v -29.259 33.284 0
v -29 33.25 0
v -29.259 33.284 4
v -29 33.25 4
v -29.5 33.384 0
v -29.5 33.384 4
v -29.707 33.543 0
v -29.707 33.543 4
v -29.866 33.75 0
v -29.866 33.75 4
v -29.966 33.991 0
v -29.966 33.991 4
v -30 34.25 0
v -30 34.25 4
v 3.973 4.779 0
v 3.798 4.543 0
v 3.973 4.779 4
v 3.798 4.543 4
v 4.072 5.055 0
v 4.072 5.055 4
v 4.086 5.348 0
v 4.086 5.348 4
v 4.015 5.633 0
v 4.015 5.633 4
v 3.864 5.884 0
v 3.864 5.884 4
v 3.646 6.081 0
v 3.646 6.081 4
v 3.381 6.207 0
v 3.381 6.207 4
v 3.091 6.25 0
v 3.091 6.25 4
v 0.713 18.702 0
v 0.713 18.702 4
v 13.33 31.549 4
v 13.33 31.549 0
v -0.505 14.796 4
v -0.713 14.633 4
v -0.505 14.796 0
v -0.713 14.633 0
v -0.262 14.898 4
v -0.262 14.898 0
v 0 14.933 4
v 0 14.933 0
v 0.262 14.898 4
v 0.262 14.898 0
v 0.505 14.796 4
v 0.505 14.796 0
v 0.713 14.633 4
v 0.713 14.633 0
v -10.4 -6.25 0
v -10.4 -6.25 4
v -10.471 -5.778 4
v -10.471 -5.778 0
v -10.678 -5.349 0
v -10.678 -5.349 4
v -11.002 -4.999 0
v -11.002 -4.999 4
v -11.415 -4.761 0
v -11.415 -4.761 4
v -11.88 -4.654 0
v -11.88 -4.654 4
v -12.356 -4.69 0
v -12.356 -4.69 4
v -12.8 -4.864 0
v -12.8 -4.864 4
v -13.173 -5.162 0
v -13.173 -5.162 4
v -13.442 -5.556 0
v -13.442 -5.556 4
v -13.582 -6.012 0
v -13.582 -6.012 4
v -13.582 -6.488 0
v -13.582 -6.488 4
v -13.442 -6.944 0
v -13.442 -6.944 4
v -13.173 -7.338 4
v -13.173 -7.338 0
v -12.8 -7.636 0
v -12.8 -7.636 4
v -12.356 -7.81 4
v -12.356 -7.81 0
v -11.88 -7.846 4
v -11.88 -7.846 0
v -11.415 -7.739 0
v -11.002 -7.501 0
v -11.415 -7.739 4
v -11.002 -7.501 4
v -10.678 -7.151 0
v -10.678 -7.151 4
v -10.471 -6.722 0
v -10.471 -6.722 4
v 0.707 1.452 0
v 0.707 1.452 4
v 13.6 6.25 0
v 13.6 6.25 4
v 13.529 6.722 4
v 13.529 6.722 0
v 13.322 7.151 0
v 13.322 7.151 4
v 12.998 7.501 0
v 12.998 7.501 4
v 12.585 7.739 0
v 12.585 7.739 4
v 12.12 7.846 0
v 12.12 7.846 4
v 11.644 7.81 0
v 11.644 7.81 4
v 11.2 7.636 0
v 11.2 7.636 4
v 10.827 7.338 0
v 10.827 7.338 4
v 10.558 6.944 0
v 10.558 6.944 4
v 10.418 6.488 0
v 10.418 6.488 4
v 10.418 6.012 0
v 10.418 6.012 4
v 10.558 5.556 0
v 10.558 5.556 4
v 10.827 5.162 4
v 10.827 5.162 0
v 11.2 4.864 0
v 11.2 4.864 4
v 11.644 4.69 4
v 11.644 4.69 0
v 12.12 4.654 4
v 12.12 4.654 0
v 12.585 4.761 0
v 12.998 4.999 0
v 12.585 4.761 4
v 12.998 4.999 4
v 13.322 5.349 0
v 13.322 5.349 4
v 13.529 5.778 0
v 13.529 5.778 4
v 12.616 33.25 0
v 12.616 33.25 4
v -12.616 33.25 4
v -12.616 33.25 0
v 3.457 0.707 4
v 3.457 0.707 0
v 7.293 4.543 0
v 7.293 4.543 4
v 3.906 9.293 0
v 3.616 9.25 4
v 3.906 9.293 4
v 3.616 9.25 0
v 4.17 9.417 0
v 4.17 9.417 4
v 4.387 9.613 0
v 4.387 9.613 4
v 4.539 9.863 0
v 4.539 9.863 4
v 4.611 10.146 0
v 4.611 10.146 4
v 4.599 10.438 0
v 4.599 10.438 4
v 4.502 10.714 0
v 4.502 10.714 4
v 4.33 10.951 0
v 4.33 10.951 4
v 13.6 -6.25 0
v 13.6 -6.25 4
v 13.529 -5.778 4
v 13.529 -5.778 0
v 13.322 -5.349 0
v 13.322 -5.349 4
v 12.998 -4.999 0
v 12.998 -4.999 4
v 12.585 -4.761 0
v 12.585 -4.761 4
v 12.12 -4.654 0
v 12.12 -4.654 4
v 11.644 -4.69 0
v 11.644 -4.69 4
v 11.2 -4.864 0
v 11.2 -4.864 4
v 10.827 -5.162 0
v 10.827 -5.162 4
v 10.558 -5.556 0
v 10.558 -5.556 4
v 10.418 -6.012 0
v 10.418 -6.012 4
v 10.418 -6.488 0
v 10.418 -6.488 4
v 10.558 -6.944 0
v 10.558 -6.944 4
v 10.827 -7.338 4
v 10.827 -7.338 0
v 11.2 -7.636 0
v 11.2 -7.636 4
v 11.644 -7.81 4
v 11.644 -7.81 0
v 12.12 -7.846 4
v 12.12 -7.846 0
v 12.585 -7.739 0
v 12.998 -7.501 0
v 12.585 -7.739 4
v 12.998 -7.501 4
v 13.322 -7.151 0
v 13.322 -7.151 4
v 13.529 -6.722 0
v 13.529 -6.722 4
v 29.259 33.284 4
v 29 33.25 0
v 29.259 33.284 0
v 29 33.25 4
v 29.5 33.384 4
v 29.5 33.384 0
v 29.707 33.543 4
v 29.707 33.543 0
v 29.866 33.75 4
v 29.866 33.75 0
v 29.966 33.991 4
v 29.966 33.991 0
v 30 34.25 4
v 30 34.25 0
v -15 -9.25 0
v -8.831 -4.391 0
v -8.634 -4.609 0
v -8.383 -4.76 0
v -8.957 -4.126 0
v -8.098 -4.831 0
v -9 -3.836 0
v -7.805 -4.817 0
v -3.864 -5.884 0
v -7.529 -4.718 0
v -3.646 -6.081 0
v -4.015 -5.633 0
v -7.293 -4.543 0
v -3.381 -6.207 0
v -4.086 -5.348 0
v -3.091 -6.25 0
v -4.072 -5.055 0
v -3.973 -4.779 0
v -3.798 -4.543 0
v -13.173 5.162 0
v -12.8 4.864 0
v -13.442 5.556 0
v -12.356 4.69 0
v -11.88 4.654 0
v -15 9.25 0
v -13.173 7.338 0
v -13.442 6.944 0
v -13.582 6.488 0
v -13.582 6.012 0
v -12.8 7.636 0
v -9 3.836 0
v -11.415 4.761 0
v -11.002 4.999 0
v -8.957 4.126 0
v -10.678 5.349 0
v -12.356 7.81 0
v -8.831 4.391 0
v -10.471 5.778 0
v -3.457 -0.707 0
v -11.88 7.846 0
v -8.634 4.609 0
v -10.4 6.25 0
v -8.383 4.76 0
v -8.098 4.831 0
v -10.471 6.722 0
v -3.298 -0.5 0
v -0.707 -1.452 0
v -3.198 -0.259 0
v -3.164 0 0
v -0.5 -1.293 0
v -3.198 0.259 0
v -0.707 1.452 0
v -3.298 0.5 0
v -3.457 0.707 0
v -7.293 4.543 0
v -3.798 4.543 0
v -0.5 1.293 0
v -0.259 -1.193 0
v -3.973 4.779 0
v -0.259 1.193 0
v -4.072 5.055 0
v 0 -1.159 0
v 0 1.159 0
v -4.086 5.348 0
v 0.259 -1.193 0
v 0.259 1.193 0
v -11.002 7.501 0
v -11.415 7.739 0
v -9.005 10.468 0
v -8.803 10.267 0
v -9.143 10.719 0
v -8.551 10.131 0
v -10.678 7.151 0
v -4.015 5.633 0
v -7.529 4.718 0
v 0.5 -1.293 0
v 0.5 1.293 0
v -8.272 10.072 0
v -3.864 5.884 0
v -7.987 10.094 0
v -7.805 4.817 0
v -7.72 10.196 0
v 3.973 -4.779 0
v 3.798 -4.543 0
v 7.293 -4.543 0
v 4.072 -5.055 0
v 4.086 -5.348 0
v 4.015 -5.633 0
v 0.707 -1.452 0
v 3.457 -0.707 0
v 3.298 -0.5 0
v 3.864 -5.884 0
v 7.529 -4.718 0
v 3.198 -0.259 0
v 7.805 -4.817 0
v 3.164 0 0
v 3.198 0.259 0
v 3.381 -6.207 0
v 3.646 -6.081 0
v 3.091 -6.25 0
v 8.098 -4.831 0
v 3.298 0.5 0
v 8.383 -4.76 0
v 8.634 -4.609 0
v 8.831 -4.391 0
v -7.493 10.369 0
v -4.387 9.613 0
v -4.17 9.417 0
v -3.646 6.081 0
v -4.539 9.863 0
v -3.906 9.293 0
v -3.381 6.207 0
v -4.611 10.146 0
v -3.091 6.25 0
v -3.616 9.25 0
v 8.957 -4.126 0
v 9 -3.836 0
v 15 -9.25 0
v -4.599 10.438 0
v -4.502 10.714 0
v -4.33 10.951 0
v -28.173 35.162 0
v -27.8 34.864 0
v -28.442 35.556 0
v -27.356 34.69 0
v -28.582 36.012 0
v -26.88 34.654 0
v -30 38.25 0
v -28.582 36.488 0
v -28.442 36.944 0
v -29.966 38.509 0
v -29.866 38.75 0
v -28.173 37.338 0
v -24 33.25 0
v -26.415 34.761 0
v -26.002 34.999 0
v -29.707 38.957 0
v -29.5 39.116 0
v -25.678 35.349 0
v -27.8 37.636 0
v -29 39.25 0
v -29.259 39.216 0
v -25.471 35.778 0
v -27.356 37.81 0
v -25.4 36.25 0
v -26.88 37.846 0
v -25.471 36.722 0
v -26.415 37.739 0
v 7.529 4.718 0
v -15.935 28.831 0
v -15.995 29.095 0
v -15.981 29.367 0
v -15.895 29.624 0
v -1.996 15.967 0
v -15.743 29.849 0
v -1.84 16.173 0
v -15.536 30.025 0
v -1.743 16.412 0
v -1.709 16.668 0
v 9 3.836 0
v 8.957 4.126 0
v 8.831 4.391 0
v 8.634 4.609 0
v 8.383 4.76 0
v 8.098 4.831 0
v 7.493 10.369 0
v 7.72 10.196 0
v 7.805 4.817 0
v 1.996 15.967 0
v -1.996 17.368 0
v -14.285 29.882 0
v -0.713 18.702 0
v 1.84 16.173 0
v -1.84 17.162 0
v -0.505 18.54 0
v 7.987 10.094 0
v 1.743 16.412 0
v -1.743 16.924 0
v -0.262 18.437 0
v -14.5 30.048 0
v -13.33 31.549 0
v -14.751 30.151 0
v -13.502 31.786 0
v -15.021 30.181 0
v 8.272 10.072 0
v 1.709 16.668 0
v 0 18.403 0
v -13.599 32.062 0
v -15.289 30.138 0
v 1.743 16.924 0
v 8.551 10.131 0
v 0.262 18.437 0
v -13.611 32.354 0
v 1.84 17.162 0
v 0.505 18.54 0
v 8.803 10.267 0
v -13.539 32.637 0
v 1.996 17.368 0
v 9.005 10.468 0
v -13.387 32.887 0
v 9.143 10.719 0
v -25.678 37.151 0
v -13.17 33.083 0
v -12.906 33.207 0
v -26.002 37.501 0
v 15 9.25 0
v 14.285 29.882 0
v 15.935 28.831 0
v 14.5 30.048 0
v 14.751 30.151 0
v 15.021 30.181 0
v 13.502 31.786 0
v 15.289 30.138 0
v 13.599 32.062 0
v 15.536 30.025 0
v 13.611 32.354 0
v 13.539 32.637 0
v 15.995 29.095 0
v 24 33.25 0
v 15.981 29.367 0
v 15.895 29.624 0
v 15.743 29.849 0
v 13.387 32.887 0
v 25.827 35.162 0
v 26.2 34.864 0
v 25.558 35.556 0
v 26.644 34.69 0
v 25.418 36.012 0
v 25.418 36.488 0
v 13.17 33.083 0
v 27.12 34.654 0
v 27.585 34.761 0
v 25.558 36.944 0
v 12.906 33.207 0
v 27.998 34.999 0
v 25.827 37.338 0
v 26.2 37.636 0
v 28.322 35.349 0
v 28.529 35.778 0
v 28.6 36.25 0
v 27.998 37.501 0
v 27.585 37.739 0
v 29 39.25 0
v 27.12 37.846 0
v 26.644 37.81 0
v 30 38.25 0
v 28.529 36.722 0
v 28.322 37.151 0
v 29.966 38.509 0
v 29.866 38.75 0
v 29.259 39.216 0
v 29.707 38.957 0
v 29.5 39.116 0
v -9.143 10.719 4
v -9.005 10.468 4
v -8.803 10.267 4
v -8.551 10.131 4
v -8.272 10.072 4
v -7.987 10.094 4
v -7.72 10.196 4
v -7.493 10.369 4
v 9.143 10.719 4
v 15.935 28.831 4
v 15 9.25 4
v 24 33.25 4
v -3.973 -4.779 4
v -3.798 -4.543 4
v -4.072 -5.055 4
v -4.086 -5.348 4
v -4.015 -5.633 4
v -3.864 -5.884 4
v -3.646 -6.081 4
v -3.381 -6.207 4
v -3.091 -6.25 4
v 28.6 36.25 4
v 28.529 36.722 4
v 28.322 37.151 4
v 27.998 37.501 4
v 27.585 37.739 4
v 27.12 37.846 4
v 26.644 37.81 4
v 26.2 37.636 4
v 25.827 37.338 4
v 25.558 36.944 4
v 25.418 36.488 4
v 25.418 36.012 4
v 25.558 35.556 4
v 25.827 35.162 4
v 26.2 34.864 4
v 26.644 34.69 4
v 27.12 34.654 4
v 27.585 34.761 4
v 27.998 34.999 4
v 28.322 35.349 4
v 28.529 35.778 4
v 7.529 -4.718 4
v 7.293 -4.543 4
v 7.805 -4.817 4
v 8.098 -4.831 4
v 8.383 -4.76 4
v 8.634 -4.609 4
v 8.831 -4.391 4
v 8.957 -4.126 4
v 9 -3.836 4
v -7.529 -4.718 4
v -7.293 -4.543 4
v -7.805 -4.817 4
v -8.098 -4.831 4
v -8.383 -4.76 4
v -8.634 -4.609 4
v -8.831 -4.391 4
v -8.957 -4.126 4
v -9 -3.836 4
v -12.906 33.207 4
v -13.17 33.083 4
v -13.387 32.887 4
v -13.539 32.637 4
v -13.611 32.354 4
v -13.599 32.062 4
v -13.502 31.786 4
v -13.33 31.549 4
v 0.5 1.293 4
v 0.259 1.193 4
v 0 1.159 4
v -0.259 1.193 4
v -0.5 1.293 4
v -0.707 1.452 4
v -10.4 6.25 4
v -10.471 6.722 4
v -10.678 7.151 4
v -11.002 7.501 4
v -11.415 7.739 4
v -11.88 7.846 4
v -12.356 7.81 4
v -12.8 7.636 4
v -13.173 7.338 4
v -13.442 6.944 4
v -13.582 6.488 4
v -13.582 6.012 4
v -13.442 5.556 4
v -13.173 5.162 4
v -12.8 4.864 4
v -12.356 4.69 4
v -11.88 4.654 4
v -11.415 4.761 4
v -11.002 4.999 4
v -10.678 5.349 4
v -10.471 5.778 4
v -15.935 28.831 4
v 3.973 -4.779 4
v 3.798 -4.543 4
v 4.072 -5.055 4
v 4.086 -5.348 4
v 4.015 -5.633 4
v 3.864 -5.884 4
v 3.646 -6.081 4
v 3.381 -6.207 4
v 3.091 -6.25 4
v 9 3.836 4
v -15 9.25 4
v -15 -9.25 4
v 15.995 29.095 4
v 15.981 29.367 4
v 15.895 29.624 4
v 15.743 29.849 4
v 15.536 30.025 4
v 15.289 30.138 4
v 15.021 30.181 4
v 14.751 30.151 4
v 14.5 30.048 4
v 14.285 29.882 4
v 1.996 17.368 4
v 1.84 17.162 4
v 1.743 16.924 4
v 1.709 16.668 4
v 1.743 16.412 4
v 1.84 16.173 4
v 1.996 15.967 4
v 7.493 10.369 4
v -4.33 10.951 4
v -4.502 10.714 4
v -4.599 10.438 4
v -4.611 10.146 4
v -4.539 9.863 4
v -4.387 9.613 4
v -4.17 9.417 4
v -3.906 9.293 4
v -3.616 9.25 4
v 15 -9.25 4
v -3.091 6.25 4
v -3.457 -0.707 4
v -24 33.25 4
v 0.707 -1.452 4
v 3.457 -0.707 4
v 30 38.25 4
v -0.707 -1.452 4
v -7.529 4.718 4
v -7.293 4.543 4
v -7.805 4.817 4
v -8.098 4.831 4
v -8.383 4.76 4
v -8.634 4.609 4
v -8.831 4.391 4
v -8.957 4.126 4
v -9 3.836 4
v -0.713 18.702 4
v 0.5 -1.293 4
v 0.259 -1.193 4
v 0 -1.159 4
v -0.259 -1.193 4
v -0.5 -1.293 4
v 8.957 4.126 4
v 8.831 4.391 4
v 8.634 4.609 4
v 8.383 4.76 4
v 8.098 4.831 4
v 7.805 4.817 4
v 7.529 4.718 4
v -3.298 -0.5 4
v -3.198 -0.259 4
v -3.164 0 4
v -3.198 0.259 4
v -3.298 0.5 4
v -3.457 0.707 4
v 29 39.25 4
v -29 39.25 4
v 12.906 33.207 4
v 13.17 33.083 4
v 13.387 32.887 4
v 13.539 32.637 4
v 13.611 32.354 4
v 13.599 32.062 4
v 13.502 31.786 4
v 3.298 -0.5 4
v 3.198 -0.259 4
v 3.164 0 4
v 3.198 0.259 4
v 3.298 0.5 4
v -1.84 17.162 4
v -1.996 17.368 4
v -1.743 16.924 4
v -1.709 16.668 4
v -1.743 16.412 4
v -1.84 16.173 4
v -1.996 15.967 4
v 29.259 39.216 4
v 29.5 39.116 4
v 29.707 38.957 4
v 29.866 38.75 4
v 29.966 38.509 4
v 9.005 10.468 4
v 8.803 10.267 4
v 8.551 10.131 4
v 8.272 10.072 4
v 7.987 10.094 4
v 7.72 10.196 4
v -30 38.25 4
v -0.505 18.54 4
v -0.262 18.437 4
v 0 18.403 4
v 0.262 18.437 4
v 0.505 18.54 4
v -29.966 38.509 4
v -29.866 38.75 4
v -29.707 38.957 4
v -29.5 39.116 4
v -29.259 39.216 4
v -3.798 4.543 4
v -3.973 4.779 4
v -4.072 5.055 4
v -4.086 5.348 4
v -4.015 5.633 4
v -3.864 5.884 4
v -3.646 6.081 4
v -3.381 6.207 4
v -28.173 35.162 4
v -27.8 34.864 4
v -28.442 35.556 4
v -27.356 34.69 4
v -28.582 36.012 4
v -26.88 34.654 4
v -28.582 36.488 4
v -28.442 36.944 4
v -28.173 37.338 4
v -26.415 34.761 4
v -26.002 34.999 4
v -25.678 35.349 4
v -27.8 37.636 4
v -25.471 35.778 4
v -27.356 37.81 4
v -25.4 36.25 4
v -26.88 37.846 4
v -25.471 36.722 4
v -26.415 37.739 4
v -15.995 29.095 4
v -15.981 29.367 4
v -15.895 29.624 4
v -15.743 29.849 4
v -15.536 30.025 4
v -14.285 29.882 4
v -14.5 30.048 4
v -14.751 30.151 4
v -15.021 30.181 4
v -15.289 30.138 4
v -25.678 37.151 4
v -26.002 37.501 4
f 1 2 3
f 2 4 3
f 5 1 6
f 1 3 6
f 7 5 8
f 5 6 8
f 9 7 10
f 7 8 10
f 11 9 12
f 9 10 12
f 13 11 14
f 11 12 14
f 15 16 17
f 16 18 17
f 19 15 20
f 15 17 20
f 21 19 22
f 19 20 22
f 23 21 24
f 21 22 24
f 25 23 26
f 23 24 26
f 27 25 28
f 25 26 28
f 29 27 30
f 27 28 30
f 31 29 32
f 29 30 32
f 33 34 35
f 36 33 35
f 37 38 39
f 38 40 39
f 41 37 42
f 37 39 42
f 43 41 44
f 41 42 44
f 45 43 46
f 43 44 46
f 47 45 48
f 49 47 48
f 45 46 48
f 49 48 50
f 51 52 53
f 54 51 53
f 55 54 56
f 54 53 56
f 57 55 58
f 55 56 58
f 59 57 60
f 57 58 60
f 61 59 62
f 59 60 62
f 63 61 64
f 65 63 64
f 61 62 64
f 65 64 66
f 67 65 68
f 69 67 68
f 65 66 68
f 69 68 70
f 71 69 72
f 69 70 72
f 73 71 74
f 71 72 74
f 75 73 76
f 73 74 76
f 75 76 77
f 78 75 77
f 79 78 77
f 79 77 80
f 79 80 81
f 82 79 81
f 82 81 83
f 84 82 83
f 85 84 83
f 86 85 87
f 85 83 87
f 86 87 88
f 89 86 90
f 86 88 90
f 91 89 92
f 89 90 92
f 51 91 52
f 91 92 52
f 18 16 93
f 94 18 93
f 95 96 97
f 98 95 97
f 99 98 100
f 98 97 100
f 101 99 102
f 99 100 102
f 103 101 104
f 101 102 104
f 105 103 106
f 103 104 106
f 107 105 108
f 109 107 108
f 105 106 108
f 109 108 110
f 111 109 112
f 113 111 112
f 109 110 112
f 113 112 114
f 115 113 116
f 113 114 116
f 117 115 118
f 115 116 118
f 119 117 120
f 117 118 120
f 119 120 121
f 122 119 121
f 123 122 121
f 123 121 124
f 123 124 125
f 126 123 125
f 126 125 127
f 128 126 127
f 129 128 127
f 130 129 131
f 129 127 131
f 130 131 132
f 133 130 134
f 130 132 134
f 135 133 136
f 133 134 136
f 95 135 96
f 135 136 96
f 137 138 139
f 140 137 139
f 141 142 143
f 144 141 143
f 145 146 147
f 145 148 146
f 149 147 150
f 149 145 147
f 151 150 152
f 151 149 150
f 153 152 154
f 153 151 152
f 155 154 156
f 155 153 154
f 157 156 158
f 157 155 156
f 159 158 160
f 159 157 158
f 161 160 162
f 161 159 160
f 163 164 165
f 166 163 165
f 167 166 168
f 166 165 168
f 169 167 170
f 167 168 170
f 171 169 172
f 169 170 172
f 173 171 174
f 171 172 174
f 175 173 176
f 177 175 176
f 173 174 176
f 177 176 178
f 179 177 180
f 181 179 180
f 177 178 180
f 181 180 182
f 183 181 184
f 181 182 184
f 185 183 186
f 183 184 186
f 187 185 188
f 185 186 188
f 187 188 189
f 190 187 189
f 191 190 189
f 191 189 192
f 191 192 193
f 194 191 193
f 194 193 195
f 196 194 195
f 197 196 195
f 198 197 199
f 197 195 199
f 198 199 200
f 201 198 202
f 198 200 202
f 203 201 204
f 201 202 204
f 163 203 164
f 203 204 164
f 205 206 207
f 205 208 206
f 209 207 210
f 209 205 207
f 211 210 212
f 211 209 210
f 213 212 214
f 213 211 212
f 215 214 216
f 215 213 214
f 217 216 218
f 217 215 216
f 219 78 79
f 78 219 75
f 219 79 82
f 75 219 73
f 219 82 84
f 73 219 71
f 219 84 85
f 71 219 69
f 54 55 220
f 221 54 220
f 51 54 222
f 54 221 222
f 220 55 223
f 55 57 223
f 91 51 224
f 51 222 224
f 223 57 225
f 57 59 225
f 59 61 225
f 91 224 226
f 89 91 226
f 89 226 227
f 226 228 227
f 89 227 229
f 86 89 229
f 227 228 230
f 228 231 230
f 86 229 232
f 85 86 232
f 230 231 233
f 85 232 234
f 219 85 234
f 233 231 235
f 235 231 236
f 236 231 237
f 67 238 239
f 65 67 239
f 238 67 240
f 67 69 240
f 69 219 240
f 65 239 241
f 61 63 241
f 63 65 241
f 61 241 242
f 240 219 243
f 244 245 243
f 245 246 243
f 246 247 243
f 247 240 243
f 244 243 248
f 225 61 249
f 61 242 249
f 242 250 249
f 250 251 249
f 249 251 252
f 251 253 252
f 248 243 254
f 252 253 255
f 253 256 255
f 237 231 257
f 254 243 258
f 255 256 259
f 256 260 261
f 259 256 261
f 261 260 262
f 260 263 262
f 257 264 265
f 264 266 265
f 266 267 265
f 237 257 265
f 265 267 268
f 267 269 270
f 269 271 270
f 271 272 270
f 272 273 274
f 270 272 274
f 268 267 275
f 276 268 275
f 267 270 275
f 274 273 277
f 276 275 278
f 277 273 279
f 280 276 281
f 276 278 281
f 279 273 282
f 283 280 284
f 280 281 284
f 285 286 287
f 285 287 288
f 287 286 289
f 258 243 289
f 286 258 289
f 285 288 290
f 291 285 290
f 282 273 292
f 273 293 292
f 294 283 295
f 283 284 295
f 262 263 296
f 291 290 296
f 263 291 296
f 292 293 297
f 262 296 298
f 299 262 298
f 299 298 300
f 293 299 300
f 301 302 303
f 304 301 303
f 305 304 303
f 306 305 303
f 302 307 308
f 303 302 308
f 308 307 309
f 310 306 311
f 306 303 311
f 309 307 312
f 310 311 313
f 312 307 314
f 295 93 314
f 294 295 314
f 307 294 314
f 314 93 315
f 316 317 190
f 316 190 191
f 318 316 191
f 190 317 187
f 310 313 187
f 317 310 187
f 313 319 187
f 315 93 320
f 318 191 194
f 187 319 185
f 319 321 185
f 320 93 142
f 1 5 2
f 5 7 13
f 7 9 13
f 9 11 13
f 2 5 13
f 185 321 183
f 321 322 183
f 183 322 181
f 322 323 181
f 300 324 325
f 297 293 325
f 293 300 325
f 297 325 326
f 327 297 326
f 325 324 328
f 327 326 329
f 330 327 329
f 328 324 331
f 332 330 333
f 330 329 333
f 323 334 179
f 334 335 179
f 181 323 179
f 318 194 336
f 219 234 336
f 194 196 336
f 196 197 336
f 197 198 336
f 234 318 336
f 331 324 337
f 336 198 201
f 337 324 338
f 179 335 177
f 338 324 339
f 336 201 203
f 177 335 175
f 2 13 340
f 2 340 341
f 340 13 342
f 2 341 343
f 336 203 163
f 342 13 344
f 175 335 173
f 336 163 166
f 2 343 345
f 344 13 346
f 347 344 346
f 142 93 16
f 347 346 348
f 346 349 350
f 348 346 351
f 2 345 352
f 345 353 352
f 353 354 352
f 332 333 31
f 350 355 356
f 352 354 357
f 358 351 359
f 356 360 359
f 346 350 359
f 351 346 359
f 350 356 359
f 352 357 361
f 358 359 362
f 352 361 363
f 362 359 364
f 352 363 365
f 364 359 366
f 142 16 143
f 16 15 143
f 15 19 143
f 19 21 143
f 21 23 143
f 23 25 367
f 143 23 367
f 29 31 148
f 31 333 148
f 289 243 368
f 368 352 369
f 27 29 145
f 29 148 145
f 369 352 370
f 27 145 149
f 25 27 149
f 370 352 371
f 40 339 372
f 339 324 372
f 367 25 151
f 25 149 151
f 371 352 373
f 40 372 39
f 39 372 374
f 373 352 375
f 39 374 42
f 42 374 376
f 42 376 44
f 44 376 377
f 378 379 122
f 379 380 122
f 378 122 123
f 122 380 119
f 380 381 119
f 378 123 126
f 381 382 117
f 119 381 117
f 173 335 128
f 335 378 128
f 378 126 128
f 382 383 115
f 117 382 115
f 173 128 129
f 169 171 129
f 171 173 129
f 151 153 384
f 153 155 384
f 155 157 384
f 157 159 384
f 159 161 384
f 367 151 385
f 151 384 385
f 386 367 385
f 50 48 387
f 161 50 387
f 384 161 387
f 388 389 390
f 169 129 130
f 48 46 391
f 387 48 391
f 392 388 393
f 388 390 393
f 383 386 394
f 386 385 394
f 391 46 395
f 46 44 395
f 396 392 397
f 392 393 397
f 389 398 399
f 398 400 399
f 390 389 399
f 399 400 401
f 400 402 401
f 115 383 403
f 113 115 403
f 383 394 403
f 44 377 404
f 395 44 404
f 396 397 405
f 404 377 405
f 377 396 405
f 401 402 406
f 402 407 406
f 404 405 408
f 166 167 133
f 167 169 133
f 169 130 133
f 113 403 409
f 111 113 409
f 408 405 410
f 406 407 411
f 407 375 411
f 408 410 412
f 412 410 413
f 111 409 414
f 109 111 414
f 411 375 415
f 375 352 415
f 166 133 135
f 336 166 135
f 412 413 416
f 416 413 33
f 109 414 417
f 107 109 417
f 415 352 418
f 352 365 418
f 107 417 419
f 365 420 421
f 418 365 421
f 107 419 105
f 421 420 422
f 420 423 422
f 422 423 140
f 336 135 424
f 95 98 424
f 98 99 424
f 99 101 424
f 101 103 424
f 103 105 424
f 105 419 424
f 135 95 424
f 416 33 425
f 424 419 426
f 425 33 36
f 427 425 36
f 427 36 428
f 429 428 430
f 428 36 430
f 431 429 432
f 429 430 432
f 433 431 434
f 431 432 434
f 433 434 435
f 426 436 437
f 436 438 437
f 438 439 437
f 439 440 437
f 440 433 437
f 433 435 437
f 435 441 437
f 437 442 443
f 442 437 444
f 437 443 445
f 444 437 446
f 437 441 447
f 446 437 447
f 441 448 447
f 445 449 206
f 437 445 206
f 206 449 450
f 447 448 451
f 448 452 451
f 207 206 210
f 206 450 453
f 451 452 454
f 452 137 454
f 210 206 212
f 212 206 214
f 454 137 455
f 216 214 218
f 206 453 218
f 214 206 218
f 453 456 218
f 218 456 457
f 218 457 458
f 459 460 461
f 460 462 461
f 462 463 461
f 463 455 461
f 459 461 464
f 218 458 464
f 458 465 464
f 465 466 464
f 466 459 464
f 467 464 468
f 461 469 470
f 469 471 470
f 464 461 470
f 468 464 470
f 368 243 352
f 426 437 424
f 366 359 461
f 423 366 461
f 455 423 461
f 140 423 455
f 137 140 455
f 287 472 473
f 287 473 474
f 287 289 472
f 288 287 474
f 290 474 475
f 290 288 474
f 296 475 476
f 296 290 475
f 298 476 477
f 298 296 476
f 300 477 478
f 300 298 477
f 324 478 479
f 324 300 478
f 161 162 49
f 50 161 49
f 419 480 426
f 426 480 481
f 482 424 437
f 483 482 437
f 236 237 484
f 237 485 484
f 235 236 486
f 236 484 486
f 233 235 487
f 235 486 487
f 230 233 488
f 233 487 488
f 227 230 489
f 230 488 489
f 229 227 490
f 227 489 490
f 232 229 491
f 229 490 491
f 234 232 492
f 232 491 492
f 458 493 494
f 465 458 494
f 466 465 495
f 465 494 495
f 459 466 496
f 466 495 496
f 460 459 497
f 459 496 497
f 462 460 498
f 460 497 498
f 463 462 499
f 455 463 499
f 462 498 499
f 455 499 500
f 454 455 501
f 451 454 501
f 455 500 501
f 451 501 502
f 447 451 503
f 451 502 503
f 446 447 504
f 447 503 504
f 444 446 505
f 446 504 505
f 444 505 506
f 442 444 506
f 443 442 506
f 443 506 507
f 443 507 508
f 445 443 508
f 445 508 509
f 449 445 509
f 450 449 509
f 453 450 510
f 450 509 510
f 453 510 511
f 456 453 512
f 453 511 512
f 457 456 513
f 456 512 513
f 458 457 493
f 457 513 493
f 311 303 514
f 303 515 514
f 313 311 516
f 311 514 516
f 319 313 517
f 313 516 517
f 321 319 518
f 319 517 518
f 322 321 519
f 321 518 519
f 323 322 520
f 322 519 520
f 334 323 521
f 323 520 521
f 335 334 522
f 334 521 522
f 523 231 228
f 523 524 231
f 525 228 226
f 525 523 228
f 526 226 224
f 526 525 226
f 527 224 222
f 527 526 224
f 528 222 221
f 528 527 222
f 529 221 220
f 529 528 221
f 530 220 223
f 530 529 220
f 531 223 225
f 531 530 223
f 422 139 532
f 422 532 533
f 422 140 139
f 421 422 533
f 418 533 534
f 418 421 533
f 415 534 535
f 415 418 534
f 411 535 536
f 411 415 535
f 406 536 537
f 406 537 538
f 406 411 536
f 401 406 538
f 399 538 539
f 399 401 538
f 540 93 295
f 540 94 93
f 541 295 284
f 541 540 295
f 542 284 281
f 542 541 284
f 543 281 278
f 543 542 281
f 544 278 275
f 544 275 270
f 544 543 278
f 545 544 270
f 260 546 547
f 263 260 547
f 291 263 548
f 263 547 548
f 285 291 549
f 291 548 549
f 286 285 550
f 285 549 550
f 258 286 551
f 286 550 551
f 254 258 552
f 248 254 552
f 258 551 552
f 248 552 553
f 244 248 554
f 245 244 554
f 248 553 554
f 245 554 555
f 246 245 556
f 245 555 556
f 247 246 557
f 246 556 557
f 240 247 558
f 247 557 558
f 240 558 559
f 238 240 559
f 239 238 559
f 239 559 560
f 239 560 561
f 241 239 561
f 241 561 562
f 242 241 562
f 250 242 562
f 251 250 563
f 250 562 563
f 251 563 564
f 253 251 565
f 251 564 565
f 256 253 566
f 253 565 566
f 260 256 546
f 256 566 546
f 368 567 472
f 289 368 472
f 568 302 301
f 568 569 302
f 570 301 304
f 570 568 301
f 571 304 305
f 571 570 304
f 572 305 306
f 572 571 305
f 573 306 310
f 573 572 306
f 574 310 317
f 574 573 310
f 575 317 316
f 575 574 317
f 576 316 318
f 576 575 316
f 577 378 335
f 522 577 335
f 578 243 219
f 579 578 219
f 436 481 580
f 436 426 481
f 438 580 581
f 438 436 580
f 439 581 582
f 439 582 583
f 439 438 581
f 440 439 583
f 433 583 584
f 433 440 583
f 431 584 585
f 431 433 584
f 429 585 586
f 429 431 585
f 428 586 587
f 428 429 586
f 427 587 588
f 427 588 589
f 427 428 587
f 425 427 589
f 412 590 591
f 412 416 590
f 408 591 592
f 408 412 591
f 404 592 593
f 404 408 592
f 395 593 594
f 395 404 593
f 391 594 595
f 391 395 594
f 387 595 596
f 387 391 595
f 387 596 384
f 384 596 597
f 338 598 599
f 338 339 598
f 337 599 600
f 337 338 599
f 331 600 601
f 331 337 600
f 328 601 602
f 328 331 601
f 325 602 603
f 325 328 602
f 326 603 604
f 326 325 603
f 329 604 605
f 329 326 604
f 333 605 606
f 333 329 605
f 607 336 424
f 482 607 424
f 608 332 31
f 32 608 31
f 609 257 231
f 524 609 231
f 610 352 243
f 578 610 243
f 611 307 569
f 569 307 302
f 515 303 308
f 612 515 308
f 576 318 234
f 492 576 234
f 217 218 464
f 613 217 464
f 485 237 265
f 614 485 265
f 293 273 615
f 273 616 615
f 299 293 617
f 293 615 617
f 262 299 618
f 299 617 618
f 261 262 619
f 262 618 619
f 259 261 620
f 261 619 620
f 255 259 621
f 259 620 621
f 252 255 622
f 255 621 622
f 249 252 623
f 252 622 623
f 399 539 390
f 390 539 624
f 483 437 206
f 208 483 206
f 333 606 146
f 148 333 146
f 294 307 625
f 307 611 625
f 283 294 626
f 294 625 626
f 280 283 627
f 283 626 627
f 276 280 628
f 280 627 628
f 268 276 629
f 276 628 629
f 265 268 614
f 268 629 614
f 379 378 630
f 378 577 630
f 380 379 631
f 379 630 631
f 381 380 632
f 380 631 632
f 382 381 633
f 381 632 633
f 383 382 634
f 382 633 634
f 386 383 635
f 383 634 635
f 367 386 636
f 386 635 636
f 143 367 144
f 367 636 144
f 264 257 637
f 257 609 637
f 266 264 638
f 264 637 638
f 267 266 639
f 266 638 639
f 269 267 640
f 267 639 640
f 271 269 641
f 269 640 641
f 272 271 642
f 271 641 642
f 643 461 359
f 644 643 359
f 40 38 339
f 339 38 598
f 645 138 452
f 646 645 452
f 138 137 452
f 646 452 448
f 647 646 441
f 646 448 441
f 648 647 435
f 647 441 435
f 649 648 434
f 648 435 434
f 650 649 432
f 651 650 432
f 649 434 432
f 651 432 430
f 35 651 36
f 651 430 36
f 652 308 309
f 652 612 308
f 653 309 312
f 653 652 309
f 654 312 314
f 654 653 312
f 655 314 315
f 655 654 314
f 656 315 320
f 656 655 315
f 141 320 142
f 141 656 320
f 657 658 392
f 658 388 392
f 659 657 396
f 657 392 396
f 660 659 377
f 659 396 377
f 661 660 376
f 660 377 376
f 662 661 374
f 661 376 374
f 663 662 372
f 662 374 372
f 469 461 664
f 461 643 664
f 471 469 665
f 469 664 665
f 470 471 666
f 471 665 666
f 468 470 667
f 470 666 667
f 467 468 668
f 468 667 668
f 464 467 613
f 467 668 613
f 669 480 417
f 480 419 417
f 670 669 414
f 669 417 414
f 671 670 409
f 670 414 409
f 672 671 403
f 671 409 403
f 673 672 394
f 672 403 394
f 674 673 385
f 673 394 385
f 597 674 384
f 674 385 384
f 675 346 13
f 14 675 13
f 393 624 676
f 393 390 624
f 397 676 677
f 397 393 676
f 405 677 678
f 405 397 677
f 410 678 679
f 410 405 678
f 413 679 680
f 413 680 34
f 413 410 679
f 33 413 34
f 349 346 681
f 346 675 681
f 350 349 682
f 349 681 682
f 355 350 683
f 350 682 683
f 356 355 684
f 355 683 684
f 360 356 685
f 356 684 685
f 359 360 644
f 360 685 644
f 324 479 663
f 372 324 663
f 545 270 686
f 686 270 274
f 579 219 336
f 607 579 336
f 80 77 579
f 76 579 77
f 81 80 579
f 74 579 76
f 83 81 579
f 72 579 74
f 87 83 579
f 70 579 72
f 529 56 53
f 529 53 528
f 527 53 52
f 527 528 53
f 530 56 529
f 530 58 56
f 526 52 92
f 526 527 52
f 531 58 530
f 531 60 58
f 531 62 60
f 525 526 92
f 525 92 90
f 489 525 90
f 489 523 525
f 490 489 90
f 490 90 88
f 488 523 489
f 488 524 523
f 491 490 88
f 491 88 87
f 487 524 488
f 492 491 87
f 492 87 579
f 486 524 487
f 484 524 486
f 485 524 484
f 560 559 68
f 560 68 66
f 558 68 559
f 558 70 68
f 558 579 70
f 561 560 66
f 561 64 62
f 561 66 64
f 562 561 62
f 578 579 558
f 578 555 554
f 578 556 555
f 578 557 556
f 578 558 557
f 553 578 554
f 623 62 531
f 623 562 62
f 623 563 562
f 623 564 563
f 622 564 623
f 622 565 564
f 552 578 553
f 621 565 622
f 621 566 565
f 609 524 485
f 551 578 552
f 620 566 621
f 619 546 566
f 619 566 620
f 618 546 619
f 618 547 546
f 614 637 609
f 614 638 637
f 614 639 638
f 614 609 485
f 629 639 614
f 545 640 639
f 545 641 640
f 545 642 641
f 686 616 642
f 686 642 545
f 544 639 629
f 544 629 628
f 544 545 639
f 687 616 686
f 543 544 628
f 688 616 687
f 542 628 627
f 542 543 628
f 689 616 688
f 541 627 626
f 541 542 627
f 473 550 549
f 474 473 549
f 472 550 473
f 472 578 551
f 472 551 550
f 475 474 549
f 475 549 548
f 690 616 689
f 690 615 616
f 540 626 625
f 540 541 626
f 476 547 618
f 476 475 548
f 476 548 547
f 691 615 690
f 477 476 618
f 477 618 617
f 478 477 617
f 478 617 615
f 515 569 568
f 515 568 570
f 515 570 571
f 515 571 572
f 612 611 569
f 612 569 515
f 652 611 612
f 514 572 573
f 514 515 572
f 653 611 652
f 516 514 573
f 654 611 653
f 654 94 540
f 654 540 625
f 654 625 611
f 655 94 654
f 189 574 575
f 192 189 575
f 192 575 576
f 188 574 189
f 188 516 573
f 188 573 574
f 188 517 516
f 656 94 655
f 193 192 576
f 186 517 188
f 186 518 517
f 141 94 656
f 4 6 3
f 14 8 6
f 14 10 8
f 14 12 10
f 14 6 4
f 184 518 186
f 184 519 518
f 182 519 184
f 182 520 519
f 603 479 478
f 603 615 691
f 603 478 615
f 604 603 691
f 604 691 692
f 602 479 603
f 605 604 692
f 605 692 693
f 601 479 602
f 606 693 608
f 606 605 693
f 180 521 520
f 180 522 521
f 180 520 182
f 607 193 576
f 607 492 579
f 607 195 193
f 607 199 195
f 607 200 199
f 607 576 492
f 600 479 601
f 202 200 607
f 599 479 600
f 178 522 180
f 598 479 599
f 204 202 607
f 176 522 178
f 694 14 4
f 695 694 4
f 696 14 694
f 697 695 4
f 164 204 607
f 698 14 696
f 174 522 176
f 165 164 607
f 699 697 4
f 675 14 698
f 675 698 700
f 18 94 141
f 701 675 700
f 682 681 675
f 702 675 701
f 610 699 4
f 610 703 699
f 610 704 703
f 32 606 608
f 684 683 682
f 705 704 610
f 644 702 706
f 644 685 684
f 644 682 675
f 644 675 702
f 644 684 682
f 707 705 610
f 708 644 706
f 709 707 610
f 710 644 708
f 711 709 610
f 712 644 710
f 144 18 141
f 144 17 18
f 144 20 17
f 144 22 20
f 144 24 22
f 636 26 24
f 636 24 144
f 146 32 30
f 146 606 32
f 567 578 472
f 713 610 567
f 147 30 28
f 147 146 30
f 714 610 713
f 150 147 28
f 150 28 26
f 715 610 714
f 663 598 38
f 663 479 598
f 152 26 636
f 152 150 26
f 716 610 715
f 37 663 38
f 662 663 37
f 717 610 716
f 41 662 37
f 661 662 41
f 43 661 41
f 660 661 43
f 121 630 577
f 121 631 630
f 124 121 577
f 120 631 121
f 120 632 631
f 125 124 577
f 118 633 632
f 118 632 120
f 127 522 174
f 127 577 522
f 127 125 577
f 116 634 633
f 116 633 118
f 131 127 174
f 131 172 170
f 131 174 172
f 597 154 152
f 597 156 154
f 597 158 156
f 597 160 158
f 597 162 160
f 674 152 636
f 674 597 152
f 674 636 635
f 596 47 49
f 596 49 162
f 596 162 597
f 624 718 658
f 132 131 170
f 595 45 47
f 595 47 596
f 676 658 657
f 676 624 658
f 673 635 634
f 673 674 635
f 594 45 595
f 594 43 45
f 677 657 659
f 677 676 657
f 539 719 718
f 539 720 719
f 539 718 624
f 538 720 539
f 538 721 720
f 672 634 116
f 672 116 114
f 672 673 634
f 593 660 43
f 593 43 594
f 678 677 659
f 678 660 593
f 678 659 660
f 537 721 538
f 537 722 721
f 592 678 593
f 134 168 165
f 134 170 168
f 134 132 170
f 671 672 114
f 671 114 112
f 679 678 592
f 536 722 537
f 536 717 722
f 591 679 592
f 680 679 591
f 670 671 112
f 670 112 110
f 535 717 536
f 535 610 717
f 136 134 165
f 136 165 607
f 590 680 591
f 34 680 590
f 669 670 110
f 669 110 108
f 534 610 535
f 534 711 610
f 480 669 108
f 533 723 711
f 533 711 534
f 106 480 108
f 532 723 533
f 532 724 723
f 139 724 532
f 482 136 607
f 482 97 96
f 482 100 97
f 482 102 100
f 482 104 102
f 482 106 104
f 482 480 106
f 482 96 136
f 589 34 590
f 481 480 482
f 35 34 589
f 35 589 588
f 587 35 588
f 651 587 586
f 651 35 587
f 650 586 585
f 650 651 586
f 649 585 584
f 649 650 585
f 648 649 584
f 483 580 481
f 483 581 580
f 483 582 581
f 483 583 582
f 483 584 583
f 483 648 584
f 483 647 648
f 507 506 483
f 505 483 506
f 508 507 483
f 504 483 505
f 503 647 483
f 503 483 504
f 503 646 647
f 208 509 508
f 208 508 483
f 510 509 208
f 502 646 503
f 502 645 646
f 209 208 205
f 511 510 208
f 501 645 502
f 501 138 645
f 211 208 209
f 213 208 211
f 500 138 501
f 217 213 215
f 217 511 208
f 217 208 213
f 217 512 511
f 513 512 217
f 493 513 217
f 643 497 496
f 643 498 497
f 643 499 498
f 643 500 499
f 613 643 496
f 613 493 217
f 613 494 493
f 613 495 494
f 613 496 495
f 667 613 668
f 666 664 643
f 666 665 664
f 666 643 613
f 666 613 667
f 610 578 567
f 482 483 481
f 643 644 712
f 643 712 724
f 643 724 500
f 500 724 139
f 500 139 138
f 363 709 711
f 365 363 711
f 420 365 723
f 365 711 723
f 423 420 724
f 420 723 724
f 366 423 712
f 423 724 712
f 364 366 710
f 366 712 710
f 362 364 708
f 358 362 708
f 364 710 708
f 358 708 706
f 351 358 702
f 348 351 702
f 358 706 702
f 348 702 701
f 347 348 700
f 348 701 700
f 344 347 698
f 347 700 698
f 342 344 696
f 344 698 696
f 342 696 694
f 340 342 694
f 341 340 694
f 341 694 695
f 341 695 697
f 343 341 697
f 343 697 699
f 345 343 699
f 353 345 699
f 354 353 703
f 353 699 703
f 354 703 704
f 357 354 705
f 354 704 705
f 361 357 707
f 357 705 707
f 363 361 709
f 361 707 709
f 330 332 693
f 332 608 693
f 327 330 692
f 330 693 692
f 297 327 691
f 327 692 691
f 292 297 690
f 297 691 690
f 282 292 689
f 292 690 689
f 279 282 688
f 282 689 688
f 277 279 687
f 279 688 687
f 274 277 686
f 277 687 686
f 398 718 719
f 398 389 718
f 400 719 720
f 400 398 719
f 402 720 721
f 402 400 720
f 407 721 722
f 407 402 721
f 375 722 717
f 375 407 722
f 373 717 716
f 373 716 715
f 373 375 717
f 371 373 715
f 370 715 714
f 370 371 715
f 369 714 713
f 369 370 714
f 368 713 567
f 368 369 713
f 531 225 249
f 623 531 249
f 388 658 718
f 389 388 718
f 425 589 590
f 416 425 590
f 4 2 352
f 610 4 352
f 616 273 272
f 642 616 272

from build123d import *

# Parameters (mm, degrees)
F1_DEPTH = 4
F2_R     = 1.6
F3_DEPTH = 4
F5_DEPTH = 4
F6_R     = 1
F7_R     = 1
F9_DEPTH = 4
F10_R    = 1


with BuildPart() as f1:
    # F0 (on Top) → F1 (new body)
    with BuildSketch(Plane.XY):
        Polygon((-15, 9.25), (-15, -9.25), (15, -9.25), (15, 9.25), (24, 33.25), (30, 33.25), (30, 39.25), (-30, 39.25), (-30, 33.25), (-24, 33.25), align=None)
    extrude(amount=F1_DEPTH)

    # F2 (on face) → F3 (cut, through all)
    with BuildSketch(Plane.XY.offset(4)):
        with Locations((-12, 6.25)):
            Circle(F2_R)
        with Locations((12, 6.25)):
            Circle(F2_R)
        with Locations((-12, -6.25)):
            Circle(F2_R)
        with Locations((12, -6.25)):
            Circle(F2_R)
        with Locations((27, 36.25)):
            Circle(F2_R)
        with Locations((-27, 36.25)):
            Circle(F2_R)
    extrude(amount=-F3_DEPTH, mode=Mode.SUBTRACT)

    # F4 (on face) → F5 (cut, through all)
    with BuildSketch(Plane.XY.offset(4)):
        Polygon((-1.307755, 16.667609), (-17.591997, 33.25), (-8.591997, 9.25), align=None)
        Polygon((8.591997, 9.25), (17.591997, 33.25), (1.307755, 16.667609), align=None)
        Polygon((15, 33.25), (-15, 33.25), (0, 17.975365), align=None)
        Polygon((0, 15.359854), (-6, 9.25), (6, 9.25), align=None)
    extrude(amount=-F5_DEPTH, mode=Mode.SUBTRACT)

    # F6
    f6_edges = [f1.edges().sort_by_distance(p)[0] for p in [
        (17.591997, 33.25, 2),
        (15, 33.25, 2),
        (-15, 33.25, 2),
        (-17.591997, 33.25, 2),
        (0, 17.975365, 2),
        (8.591997, 9.25, 2),
        (-8.591997, 9.25, 2),
        (-6, 9.25, 2),
        (6, 9.25, 2),
        (0, 15.359854, 2),
        (-1.307755, 16.667609, 2),
        (1.307755, 16.667609, 2),
    ]]
    fillet(f6_edges, radius=F6_R)

    # F7
    f7_edges = [f1.edges().sort_by_distance(p)[0] for p in [
        (30, 39.25, 2),
        (30, 33.25, 2),
        (-30, 33.25, 2),
        (-30, 39.25, 2),
    ]]
    fillet(f7_edges, radius=F7_R)

    # F8 (on face) → F9 (cut, through all)
    with BuildSketch(Plane(origin=(0, 0, 0), x_dir=(1, 0, 0), z_dir=(0, 0, -1))):
        Polygon((-9, 6.25), (-9, -6.25), (-2.75, 0), align=None)
        Polygon((0, -0.744883), (-5.505117, -6.25), (5.505117, -6.25), align=None)
        Polygon((2.75, 0), (9, -6.25), (9, 6.25), align=None)
        Polygon((5.505117, 6.25), (-5.505117, 6.25), (0, 0.744883), align=None)
    extrude(amount=-F9_DEPTH, mode=Mode.SUBTRACT)

    # F10
    f10_edges = [f1.edges().sort_by_distance(p)[0] for p in [
        (-9, 6.25, 2),
        (-5.505117, 6.25, 2),
        (5.505117, 6.25, 2),
        (9, 6.25, 2),
        (-9, -6.25, 2),
        (-2.75, 0, 2),
        (5.505117, -6.25, 2),
        (9, -6.25, 2),
        (2.75, 0, 2),
        (0, -0.744883, 2),
        (-5.505117, -6.25, 2),
        (0, 0.744883, 2),
    ]]
    fillet(f10_edges, radius=F10_R)


solid = f1.part
